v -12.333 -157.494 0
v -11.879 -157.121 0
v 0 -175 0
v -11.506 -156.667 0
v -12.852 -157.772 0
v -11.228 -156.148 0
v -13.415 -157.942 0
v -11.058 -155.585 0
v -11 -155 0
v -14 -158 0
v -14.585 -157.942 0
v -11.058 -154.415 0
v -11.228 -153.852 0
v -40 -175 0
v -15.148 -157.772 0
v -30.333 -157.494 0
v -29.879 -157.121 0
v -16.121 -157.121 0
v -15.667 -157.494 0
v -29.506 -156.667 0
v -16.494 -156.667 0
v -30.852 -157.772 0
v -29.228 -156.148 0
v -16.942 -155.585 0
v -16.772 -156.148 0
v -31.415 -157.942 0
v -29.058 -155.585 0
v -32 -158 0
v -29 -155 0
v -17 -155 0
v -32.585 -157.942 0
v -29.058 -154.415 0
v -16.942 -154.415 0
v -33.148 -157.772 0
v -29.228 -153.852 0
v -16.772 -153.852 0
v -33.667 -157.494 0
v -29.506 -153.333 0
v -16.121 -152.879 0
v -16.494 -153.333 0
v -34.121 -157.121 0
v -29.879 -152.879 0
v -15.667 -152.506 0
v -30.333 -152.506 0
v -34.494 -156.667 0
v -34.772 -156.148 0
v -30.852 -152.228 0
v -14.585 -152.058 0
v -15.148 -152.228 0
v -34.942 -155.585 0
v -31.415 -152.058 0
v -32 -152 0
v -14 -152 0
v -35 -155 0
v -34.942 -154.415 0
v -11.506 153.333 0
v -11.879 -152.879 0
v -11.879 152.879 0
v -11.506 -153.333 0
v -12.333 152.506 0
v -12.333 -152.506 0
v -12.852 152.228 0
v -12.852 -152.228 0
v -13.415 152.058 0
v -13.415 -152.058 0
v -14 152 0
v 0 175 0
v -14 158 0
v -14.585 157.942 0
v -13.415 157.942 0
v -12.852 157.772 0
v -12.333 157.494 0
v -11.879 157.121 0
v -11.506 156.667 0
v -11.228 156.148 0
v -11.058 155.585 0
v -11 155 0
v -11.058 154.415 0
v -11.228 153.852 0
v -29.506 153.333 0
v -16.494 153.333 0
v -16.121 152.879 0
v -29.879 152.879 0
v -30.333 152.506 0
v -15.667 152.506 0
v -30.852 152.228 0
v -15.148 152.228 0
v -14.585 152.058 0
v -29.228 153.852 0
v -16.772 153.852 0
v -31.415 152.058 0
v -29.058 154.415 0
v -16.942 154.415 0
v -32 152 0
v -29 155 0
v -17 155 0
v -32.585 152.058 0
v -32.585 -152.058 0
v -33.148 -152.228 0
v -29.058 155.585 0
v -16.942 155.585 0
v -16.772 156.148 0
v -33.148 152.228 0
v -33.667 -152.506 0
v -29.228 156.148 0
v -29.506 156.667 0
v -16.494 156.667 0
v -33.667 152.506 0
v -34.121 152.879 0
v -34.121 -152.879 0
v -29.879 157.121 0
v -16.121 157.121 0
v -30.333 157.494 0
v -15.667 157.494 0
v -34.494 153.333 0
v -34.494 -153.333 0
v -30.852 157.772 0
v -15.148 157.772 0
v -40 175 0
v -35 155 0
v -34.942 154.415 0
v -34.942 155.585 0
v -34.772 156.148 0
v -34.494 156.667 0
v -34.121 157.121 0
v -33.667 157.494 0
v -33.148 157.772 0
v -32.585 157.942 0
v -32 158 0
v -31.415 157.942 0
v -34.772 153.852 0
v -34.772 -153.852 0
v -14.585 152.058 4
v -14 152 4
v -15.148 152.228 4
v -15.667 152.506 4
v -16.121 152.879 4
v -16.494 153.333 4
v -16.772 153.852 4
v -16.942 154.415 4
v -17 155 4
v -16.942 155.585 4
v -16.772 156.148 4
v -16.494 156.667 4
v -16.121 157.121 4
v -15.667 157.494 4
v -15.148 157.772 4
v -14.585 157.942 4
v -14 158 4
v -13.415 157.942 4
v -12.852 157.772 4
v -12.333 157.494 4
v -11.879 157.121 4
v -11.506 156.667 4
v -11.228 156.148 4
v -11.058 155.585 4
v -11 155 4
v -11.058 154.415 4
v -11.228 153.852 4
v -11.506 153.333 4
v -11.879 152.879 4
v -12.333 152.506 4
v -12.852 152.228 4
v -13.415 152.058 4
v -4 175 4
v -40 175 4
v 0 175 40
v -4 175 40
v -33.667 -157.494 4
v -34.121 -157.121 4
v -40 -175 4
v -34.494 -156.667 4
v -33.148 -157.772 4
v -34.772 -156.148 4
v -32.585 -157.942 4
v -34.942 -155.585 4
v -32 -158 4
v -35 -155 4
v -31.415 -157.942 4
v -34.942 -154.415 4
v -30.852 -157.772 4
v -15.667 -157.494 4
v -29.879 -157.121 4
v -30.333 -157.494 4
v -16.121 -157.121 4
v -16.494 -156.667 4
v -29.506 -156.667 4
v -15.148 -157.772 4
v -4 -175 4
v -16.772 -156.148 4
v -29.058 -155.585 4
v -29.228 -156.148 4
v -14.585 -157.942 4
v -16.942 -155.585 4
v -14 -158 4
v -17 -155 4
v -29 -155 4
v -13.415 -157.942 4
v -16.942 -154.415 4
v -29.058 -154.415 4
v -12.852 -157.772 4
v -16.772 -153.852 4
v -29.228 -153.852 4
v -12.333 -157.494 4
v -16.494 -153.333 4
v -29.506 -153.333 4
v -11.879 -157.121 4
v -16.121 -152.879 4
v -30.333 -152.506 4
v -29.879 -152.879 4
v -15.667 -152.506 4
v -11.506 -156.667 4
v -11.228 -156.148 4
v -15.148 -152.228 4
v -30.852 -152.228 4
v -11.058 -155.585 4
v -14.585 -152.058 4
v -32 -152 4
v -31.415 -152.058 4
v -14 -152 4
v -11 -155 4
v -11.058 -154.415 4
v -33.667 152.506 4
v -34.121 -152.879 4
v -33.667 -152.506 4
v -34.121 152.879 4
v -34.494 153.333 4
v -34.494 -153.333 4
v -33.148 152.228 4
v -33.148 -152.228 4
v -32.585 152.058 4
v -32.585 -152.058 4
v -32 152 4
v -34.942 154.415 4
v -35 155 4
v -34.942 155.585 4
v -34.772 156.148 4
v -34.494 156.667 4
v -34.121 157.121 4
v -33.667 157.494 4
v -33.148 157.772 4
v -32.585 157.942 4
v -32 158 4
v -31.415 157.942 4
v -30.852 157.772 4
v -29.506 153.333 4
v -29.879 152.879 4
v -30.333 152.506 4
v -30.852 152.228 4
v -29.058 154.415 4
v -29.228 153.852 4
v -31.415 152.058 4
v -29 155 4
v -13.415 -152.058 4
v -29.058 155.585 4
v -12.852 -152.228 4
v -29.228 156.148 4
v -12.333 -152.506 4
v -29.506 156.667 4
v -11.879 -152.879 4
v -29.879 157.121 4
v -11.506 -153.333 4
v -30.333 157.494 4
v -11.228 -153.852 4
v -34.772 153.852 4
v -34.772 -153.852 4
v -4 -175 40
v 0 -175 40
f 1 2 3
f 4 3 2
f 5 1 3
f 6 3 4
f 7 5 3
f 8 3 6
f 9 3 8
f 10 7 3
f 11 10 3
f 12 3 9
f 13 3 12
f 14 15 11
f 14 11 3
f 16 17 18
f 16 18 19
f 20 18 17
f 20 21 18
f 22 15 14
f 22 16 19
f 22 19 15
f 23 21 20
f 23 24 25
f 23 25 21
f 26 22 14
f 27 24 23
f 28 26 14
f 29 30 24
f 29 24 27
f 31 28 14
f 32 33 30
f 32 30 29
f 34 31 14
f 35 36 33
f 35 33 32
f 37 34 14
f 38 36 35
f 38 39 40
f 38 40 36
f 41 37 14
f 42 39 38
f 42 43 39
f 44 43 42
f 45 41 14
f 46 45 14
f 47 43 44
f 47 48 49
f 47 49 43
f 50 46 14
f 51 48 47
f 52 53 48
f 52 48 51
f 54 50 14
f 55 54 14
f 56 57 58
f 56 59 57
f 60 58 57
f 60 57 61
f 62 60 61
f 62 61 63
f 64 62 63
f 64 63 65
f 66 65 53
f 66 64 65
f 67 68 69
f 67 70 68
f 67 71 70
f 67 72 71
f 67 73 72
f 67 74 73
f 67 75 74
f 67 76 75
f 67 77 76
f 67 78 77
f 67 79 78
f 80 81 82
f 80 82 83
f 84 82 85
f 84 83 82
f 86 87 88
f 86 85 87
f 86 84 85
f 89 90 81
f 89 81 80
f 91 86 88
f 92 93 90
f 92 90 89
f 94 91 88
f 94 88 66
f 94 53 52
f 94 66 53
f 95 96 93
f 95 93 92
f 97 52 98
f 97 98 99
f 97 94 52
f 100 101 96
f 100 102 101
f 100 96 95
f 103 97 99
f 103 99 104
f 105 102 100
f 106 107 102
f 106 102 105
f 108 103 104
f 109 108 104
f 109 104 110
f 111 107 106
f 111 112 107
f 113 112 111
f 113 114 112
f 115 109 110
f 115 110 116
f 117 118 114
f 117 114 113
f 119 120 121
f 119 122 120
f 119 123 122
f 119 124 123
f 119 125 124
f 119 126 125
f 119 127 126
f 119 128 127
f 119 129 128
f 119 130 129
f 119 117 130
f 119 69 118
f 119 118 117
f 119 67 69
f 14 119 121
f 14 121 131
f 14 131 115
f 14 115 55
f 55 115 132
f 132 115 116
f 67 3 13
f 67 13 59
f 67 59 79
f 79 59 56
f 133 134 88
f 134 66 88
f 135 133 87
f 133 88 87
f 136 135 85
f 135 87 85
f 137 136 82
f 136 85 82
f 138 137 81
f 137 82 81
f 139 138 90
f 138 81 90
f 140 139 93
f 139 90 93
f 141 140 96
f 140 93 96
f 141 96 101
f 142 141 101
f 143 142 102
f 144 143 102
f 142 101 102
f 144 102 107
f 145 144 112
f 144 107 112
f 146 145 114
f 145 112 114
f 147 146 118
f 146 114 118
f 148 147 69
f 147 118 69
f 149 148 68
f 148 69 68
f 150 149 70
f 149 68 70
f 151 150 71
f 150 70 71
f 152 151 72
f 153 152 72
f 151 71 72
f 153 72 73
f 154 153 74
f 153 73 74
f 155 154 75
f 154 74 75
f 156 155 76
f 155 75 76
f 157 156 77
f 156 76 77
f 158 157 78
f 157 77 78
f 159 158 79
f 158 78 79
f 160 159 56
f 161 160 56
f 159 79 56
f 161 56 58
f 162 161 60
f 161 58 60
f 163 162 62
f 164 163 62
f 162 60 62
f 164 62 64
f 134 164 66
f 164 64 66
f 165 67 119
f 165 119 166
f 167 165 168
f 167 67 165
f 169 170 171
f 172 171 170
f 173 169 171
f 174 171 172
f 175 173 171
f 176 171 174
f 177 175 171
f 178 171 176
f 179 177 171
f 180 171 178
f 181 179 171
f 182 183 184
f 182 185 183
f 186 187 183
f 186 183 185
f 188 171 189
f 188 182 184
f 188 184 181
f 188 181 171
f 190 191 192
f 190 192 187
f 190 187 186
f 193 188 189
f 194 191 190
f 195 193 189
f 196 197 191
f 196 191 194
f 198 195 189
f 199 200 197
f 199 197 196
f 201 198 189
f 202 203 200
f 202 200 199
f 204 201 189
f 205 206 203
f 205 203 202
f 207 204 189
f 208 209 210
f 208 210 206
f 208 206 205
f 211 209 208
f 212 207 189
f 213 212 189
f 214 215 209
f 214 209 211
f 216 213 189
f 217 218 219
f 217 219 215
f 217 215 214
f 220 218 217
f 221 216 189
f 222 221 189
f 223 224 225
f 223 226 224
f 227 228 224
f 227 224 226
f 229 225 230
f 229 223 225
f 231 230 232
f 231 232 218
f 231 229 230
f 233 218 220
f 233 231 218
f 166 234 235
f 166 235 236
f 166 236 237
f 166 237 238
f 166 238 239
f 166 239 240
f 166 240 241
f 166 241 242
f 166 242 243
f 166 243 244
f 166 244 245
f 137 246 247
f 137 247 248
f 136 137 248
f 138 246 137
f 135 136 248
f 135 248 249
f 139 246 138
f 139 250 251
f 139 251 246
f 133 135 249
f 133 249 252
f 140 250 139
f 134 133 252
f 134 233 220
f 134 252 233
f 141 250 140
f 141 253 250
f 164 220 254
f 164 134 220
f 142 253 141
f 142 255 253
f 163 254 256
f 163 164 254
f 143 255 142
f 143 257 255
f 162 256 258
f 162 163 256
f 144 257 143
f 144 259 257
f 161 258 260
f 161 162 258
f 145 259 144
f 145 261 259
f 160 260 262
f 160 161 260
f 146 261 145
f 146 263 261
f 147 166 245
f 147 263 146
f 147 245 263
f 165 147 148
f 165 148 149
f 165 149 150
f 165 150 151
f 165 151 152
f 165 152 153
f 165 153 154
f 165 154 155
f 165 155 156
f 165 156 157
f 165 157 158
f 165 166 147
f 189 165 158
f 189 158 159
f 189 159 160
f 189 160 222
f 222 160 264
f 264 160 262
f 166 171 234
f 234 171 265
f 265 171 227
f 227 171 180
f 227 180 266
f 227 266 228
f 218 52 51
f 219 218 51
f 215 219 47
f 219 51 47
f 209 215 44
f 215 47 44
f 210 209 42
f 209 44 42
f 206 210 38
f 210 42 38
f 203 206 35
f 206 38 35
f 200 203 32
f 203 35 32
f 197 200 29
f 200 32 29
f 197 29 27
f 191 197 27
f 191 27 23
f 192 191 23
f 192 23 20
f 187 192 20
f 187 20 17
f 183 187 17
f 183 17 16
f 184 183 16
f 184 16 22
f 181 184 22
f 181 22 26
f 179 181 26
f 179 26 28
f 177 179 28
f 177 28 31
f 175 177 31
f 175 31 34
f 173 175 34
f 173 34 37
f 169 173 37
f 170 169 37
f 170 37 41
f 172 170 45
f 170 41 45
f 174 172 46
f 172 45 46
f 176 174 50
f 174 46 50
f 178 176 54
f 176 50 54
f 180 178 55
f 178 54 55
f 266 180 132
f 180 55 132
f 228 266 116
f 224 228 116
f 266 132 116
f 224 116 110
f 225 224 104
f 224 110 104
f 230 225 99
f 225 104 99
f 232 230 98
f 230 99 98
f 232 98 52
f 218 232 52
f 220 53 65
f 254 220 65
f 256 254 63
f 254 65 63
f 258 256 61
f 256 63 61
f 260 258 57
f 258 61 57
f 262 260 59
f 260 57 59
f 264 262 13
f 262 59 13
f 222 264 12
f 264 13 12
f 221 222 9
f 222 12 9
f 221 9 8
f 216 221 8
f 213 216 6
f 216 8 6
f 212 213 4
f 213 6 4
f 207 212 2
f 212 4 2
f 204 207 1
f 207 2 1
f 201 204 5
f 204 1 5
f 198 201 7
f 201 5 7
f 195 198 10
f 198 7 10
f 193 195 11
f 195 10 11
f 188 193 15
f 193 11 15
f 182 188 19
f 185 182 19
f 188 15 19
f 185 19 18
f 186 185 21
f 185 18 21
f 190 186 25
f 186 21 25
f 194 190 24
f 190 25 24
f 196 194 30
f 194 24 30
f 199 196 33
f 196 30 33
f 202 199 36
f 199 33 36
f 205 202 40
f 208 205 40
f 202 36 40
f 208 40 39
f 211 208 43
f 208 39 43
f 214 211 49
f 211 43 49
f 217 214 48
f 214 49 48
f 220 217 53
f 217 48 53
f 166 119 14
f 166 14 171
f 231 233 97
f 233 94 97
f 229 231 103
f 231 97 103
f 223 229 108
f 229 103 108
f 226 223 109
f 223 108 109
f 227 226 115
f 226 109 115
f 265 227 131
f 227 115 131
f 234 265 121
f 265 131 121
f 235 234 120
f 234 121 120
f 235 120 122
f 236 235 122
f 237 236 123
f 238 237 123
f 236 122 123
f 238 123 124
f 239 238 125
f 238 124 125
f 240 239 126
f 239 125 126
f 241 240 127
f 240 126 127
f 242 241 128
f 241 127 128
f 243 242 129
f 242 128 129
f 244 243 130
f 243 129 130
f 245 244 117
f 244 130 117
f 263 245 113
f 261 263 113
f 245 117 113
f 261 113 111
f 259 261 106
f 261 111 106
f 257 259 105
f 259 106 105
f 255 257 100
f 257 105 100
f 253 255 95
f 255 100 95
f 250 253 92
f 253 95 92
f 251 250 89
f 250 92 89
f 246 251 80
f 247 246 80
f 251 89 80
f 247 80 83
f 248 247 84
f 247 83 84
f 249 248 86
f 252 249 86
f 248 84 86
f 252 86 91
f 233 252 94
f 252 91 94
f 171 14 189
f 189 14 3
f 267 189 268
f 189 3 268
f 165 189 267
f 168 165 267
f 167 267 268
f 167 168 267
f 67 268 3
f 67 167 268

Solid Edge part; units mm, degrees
sketch "Sketch1" plane through (-9.04, 0, 33.0648) normal (0, -1, 0) x (1, 0, 0)
  line L0 (-30.96, -29.0648) -> (5.04, -29.0648)
  line L1 (5.04, -29.0648) -> (5.04, 6.9352)
  line L2 (5.04, 6.9352) -> (9.04, 6.9352)
  line L3 (9.04, 6.9352) -> (9.04, -33.0648)
  line L4 (9.04, -33.0648) -> (-30.96, -33.0648)
  line L5 (-30.96, -33.0648) -> (-30.96, -29.0648)
extrude "Protrusion1" add sketch "Sketch1" along normal mid plane 350
sketch "Sketch2" plane through (-20, 0, 0) normal (0, 0, -1) x (0, -1, 0)
  circle A0 centre (-155, 12) radius 3
  circle A1 centre (-155, -6) radius 3
  dimension "D1" = 10
  dimension "D2" = 18
  dimension "D3" = 20
extrude "Cutout1" cut sketch "Sketch2" against normal through all
mirror "Mirror1" about plane through (0, 0, 0) normal (0, -1, 0) of "Cutout1"
